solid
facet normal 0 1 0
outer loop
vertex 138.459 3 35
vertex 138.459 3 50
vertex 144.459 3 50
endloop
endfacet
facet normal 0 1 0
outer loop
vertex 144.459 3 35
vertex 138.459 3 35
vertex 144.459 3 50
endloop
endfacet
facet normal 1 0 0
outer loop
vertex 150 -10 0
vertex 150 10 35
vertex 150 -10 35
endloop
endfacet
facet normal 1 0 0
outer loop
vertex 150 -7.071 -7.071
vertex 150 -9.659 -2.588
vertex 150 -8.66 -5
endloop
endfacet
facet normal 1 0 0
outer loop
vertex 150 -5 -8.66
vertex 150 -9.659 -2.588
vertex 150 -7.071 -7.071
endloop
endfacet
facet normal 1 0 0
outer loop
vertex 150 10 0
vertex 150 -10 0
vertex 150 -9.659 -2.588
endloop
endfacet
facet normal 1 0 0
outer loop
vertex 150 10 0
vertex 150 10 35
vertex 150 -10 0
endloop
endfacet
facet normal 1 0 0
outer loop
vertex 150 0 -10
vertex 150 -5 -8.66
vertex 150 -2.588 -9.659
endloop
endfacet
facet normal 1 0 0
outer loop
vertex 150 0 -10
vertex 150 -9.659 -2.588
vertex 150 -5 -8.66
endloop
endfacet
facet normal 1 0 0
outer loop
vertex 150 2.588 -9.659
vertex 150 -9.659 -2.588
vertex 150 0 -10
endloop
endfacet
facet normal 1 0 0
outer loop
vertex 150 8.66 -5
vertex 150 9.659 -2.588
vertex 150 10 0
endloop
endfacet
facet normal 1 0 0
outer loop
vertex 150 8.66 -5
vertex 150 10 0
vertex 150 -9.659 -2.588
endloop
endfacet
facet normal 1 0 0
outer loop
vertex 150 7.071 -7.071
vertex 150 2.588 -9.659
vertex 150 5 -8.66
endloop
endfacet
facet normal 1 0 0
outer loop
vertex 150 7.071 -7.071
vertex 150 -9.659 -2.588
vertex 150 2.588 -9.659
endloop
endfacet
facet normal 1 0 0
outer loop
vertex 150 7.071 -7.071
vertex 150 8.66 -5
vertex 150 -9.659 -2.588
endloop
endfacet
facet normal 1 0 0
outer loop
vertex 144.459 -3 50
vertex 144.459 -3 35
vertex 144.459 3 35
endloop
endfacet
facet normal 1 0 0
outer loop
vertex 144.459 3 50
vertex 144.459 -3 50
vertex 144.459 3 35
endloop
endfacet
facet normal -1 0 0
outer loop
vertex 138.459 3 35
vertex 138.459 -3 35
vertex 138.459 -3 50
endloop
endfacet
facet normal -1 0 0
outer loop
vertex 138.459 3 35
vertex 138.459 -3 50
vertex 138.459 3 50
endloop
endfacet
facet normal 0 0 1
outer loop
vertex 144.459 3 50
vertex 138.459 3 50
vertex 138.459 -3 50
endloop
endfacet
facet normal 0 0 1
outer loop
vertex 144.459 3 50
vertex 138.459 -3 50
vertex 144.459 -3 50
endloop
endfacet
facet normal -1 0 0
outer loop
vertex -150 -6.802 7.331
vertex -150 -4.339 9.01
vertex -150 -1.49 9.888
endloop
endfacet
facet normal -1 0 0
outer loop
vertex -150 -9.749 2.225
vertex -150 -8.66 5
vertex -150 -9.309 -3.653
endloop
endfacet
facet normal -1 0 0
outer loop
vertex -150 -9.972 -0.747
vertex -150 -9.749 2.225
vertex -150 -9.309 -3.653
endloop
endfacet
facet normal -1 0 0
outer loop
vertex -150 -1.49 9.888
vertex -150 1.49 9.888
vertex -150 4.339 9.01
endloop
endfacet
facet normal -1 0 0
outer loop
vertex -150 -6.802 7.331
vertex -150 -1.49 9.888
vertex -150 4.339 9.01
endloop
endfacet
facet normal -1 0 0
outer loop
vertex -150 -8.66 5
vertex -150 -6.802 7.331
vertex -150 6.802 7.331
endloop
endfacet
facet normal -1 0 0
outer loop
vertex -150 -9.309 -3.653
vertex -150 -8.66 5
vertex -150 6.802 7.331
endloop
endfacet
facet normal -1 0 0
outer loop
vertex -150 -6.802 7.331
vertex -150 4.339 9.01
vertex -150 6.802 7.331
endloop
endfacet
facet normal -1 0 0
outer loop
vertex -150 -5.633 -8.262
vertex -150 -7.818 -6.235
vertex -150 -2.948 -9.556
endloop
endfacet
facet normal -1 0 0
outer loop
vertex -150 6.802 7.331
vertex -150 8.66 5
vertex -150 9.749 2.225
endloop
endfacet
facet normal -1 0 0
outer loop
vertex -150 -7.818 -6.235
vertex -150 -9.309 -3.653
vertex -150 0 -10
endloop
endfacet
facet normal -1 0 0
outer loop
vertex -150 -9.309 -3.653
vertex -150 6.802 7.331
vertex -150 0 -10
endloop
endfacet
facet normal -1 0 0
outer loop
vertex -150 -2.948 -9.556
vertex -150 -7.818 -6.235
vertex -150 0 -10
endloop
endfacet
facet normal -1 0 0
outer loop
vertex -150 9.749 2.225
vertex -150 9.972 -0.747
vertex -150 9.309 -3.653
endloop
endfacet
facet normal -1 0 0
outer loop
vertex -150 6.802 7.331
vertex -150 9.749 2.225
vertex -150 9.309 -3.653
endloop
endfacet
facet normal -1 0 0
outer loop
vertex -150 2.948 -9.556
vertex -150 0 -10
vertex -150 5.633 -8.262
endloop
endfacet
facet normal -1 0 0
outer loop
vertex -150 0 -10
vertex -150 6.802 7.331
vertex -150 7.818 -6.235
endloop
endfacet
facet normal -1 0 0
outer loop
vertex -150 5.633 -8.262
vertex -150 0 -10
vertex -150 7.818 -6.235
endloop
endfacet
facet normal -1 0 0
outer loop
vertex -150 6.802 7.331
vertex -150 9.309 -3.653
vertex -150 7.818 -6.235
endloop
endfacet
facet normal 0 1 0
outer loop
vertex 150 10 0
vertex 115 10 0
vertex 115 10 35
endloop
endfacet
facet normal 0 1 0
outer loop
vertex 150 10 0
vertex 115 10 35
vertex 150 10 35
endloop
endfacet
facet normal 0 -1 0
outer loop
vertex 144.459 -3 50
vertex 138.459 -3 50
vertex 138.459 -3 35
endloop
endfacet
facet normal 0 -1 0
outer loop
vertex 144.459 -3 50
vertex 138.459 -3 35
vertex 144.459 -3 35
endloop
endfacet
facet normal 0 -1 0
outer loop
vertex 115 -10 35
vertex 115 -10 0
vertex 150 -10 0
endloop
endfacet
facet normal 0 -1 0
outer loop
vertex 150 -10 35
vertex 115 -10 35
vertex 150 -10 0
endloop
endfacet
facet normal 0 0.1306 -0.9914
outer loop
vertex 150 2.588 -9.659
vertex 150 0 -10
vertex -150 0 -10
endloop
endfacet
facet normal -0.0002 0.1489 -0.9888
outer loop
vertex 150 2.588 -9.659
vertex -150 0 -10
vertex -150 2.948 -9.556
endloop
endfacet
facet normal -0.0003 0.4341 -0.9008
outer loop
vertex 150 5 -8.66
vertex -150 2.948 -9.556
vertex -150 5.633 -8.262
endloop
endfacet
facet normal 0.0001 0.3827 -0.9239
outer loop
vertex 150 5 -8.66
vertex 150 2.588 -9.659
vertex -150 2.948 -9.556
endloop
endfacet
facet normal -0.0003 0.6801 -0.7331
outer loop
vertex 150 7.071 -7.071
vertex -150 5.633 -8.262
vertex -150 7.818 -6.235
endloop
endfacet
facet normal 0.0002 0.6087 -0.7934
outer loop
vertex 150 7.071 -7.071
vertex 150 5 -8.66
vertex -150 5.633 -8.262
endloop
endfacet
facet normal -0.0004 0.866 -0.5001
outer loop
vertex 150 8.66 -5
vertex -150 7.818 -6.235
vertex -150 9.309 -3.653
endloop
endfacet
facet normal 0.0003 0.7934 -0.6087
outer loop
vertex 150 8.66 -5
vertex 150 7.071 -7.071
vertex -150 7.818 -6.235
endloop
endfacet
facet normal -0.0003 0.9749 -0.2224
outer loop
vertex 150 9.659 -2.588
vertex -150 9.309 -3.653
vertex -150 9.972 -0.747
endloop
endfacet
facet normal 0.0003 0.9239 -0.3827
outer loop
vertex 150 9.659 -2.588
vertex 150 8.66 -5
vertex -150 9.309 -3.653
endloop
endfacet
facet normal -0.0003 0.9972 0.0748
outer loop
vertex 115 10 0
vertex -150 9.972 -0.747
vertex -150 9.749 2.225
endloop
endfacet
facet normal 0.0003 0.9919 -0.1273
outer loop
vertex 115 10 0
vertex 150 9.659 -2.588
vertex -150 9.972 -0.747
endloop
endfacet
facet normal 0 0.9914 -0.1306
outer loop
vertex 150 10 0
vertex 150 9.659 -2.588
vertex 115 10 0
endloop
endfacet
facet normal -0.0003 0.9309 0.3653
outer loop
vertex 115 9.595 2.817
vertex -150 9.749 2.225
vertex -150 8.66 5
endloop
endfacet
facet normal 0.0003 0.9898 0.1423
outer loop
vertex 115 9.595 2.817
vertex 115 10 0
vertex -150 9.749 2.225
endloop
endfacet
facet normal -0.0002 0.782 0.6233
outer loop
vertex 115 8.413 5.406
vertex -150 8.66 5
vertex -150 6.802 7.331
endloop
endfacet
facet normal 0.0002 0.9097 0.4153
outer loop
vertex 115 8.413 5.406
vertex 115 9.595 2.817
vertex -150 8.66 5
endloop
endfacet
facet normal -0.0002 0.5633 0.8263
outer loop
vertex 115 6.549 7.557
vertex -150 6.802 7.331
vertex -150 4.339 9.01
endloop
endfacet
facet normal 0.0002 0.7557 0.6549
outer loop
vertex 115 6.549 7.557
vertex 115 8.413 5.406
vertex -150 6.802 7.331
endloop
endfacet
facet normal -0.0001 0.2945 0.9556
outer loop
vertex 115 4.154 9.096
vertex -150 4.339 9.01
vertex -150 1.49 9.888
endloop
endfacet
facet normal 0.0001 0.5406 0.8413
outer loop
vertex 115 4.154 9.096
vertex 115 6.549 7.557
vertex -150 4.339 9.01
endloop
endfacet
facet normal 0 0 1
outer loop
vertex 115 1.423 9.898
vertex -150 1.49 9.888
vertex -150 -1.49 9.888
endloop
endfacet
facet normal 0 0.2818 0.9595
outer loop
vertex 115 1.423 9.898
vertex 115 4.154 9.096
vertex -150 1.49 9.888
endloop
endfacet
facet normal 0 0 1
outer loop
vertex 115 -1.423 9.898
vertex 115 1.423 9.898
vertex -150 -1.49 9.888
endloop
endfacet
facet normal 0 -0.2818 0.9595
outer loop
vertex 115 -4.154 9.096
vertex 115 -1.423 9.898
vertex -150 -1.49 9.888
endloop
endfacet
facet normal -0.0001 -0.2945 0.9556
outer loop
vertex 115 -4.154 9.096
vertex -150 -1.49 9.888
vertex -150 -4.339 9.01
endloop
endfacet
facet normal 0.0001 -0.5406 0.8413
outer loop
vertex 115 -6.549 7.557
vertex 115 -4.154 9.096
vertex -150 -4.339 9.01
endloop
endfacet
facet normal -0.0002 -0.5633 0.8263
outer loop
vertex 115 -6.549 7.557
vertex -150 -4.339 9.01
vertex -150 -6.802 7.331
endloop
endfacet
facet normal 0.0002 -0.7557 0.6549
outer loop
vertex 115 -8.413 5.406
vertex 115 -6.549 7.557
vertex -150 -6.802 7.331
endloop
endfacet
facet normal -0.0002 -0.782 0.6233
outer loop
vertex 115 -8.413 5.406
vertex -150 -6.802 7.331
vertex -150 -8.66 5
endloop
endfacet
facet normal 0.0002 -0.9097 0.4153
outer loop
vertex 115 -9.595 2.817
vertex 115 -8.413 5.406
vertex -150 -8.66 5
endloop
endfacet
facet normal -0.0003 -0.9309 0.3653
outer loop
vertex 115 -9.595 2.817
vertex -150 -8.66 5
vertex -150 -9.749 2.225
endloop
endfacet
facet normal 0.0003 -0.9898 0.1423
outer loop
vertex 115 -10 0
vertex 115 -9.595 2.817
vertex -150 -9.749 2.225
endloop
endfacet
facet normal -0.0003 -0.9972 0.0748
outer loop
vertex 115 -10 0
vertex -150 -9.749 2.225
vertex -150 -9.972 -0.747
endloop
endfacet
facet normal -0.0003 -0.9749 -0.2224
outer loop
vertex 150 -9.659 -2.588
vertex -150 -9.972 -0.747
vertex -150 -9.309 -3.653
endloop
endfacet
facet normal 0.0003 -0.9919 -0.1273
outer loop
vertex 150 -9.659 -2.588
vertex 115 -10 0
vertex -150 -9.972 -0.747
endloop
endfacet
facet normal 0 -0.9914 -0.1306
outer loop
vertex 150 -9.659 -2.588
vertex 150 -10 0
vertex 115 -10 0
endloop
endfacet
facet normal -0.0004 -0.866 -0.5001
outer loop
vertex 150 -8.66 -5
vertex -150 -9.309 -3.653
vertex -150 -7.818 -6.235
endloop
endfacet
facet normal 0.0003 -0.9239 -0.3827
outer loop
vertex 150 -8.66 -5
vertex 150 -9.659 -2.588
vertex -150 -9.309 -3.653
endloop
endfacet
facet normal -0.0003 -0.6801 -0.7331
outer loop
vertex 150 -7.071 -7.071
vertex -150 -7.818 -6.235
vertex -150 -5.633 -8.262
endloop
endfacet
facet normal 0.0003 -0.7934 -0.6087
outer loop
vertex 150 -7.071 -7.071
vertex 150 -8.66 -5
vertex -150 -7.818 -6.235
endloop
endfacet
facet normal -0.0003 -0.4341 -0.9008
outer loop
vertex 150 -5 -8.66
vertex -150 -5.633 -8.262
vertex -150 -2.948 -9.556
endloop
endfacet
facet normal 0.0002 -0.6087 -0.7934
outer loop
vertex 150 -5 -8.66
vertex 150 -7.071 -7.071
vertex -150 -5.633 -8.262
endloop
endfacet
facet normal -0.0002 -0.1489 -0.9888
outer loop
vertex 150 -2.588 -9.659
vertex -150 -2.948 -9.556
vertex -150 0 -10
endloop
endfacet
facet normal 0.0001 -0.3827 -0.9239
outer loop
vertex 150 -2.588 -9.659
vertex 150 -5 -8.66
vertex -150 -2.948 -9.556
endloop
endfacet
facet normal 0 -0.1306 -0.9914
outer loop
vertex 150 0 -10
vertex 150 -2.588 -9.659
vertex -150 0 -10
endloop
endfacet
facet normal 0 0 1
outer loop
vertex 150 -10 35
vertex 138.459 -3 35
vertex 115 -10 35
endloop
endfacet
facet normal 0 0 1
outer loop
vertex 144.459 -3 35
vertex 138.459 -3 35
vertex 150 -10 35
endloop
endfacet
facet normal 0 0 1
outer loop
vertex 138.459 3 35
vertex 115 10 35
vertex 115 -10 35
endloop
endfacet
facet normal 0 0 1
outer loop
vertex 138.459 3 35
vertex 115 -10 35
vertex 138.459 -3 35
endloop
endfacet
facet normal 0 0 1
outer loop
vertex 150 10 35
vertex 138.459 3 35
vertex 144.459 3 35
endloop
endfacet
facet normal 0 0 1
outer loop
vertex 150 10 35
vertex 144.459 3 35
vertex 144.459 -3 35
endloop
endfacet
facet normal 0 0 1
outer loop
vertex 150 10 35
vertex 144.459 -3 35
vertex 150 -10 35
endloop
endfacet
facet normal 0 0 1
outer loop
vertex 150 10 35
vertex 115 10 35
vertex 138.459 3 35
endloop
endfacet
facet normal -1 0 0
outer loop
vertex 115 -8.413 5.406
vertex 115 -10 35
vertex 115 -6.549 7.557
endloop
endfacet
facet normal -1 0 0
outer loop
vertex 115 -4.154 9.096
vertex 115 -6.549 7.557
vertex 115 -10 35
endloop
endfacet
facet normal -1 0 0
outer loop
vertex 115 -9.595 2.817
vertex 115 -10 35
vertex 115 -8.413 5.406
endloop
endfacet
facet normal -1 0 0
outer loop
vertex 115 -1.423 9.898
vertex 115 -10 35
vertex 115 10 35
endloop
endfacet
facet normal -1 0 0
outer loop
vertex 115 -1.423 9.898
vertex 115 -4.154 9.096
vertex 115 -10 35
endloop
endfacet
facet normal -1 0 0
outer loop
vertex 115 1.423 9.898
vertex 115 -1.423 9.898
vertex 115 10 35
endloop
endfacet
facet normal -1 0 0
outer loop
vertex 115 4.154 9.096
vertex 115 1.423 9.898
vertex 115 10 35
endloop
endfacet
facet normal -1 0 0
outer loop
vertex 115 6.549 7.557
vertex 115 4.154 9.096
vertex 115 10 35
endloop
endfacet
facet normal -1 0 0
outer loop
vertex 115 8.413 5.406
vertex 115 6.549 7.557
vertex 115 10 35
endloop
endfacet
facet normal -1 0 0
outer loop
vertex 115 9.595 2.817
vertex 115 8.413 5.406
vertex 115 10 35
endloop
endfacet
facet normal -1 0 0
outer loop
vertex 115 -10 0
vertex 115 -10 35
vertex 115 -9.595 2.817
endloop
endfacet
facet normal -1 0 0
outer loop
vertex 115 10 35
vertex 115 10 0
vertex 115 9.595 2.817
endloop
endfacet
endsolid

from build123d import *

# Parameters (mm, degrees)
SKETCH_1_R      = 10
EXTRUDE_1_DEPTH = 150
SKETCH_2_W      = 35
SKETCH_2_H      = 20
EXTRUDE_2_DEPTH = 35
SKETCH_3_W      = 6
SKETCH_3_H      = 6
SKETCH_3_R      = 0.5
EXTRUDE_3_DEPTH = 15


with BuildPart() as part:
    # 草图1 → 凸台-拉伸1 (new, symmetric)
    with BuildSketch(Plane(origin=(0, 0, 0), x_dir=(0, 0, -1), z_dir=(1, 0, 0))):
        Circle(SKETCH_1_R)
    extrude(amount=EXTRUDE_1_DEPTH, both=True)

    # 草图2 → 凸台-拉伸2 (add)
    with BuildSketch(Plane.XY):
        with Locations((132.5, 0)):
            Rectangle(SKETCH_2_W, SKETCH_2_H)
    extrude(amount=EXTRUDE_2_DEPTH)

    # 草图3 → 凸台-拉伸3 (add)
    # profile 1 of 2: a face of its own
    with BuildSketch(Plane.XY.offset(35)):
        with Locations((141.458586474, 0)):
            Rectangle(SKETCH_3_W, SKETCH_3_H)
        with Locations((141.458586474, 0)):
            Circle(SKETCH_3_R, mode=Mode.SUBTRACT)
    # profile 2 of 2: a face of its own
    with BuildSketch(Plane.XY.offset(35)):
        with Locations((141.458586474, 0)):
            Circle(SKETCH_3_R)
    extrude(amount=EXTRUDE_3_DEPTH)


solid = part.part
